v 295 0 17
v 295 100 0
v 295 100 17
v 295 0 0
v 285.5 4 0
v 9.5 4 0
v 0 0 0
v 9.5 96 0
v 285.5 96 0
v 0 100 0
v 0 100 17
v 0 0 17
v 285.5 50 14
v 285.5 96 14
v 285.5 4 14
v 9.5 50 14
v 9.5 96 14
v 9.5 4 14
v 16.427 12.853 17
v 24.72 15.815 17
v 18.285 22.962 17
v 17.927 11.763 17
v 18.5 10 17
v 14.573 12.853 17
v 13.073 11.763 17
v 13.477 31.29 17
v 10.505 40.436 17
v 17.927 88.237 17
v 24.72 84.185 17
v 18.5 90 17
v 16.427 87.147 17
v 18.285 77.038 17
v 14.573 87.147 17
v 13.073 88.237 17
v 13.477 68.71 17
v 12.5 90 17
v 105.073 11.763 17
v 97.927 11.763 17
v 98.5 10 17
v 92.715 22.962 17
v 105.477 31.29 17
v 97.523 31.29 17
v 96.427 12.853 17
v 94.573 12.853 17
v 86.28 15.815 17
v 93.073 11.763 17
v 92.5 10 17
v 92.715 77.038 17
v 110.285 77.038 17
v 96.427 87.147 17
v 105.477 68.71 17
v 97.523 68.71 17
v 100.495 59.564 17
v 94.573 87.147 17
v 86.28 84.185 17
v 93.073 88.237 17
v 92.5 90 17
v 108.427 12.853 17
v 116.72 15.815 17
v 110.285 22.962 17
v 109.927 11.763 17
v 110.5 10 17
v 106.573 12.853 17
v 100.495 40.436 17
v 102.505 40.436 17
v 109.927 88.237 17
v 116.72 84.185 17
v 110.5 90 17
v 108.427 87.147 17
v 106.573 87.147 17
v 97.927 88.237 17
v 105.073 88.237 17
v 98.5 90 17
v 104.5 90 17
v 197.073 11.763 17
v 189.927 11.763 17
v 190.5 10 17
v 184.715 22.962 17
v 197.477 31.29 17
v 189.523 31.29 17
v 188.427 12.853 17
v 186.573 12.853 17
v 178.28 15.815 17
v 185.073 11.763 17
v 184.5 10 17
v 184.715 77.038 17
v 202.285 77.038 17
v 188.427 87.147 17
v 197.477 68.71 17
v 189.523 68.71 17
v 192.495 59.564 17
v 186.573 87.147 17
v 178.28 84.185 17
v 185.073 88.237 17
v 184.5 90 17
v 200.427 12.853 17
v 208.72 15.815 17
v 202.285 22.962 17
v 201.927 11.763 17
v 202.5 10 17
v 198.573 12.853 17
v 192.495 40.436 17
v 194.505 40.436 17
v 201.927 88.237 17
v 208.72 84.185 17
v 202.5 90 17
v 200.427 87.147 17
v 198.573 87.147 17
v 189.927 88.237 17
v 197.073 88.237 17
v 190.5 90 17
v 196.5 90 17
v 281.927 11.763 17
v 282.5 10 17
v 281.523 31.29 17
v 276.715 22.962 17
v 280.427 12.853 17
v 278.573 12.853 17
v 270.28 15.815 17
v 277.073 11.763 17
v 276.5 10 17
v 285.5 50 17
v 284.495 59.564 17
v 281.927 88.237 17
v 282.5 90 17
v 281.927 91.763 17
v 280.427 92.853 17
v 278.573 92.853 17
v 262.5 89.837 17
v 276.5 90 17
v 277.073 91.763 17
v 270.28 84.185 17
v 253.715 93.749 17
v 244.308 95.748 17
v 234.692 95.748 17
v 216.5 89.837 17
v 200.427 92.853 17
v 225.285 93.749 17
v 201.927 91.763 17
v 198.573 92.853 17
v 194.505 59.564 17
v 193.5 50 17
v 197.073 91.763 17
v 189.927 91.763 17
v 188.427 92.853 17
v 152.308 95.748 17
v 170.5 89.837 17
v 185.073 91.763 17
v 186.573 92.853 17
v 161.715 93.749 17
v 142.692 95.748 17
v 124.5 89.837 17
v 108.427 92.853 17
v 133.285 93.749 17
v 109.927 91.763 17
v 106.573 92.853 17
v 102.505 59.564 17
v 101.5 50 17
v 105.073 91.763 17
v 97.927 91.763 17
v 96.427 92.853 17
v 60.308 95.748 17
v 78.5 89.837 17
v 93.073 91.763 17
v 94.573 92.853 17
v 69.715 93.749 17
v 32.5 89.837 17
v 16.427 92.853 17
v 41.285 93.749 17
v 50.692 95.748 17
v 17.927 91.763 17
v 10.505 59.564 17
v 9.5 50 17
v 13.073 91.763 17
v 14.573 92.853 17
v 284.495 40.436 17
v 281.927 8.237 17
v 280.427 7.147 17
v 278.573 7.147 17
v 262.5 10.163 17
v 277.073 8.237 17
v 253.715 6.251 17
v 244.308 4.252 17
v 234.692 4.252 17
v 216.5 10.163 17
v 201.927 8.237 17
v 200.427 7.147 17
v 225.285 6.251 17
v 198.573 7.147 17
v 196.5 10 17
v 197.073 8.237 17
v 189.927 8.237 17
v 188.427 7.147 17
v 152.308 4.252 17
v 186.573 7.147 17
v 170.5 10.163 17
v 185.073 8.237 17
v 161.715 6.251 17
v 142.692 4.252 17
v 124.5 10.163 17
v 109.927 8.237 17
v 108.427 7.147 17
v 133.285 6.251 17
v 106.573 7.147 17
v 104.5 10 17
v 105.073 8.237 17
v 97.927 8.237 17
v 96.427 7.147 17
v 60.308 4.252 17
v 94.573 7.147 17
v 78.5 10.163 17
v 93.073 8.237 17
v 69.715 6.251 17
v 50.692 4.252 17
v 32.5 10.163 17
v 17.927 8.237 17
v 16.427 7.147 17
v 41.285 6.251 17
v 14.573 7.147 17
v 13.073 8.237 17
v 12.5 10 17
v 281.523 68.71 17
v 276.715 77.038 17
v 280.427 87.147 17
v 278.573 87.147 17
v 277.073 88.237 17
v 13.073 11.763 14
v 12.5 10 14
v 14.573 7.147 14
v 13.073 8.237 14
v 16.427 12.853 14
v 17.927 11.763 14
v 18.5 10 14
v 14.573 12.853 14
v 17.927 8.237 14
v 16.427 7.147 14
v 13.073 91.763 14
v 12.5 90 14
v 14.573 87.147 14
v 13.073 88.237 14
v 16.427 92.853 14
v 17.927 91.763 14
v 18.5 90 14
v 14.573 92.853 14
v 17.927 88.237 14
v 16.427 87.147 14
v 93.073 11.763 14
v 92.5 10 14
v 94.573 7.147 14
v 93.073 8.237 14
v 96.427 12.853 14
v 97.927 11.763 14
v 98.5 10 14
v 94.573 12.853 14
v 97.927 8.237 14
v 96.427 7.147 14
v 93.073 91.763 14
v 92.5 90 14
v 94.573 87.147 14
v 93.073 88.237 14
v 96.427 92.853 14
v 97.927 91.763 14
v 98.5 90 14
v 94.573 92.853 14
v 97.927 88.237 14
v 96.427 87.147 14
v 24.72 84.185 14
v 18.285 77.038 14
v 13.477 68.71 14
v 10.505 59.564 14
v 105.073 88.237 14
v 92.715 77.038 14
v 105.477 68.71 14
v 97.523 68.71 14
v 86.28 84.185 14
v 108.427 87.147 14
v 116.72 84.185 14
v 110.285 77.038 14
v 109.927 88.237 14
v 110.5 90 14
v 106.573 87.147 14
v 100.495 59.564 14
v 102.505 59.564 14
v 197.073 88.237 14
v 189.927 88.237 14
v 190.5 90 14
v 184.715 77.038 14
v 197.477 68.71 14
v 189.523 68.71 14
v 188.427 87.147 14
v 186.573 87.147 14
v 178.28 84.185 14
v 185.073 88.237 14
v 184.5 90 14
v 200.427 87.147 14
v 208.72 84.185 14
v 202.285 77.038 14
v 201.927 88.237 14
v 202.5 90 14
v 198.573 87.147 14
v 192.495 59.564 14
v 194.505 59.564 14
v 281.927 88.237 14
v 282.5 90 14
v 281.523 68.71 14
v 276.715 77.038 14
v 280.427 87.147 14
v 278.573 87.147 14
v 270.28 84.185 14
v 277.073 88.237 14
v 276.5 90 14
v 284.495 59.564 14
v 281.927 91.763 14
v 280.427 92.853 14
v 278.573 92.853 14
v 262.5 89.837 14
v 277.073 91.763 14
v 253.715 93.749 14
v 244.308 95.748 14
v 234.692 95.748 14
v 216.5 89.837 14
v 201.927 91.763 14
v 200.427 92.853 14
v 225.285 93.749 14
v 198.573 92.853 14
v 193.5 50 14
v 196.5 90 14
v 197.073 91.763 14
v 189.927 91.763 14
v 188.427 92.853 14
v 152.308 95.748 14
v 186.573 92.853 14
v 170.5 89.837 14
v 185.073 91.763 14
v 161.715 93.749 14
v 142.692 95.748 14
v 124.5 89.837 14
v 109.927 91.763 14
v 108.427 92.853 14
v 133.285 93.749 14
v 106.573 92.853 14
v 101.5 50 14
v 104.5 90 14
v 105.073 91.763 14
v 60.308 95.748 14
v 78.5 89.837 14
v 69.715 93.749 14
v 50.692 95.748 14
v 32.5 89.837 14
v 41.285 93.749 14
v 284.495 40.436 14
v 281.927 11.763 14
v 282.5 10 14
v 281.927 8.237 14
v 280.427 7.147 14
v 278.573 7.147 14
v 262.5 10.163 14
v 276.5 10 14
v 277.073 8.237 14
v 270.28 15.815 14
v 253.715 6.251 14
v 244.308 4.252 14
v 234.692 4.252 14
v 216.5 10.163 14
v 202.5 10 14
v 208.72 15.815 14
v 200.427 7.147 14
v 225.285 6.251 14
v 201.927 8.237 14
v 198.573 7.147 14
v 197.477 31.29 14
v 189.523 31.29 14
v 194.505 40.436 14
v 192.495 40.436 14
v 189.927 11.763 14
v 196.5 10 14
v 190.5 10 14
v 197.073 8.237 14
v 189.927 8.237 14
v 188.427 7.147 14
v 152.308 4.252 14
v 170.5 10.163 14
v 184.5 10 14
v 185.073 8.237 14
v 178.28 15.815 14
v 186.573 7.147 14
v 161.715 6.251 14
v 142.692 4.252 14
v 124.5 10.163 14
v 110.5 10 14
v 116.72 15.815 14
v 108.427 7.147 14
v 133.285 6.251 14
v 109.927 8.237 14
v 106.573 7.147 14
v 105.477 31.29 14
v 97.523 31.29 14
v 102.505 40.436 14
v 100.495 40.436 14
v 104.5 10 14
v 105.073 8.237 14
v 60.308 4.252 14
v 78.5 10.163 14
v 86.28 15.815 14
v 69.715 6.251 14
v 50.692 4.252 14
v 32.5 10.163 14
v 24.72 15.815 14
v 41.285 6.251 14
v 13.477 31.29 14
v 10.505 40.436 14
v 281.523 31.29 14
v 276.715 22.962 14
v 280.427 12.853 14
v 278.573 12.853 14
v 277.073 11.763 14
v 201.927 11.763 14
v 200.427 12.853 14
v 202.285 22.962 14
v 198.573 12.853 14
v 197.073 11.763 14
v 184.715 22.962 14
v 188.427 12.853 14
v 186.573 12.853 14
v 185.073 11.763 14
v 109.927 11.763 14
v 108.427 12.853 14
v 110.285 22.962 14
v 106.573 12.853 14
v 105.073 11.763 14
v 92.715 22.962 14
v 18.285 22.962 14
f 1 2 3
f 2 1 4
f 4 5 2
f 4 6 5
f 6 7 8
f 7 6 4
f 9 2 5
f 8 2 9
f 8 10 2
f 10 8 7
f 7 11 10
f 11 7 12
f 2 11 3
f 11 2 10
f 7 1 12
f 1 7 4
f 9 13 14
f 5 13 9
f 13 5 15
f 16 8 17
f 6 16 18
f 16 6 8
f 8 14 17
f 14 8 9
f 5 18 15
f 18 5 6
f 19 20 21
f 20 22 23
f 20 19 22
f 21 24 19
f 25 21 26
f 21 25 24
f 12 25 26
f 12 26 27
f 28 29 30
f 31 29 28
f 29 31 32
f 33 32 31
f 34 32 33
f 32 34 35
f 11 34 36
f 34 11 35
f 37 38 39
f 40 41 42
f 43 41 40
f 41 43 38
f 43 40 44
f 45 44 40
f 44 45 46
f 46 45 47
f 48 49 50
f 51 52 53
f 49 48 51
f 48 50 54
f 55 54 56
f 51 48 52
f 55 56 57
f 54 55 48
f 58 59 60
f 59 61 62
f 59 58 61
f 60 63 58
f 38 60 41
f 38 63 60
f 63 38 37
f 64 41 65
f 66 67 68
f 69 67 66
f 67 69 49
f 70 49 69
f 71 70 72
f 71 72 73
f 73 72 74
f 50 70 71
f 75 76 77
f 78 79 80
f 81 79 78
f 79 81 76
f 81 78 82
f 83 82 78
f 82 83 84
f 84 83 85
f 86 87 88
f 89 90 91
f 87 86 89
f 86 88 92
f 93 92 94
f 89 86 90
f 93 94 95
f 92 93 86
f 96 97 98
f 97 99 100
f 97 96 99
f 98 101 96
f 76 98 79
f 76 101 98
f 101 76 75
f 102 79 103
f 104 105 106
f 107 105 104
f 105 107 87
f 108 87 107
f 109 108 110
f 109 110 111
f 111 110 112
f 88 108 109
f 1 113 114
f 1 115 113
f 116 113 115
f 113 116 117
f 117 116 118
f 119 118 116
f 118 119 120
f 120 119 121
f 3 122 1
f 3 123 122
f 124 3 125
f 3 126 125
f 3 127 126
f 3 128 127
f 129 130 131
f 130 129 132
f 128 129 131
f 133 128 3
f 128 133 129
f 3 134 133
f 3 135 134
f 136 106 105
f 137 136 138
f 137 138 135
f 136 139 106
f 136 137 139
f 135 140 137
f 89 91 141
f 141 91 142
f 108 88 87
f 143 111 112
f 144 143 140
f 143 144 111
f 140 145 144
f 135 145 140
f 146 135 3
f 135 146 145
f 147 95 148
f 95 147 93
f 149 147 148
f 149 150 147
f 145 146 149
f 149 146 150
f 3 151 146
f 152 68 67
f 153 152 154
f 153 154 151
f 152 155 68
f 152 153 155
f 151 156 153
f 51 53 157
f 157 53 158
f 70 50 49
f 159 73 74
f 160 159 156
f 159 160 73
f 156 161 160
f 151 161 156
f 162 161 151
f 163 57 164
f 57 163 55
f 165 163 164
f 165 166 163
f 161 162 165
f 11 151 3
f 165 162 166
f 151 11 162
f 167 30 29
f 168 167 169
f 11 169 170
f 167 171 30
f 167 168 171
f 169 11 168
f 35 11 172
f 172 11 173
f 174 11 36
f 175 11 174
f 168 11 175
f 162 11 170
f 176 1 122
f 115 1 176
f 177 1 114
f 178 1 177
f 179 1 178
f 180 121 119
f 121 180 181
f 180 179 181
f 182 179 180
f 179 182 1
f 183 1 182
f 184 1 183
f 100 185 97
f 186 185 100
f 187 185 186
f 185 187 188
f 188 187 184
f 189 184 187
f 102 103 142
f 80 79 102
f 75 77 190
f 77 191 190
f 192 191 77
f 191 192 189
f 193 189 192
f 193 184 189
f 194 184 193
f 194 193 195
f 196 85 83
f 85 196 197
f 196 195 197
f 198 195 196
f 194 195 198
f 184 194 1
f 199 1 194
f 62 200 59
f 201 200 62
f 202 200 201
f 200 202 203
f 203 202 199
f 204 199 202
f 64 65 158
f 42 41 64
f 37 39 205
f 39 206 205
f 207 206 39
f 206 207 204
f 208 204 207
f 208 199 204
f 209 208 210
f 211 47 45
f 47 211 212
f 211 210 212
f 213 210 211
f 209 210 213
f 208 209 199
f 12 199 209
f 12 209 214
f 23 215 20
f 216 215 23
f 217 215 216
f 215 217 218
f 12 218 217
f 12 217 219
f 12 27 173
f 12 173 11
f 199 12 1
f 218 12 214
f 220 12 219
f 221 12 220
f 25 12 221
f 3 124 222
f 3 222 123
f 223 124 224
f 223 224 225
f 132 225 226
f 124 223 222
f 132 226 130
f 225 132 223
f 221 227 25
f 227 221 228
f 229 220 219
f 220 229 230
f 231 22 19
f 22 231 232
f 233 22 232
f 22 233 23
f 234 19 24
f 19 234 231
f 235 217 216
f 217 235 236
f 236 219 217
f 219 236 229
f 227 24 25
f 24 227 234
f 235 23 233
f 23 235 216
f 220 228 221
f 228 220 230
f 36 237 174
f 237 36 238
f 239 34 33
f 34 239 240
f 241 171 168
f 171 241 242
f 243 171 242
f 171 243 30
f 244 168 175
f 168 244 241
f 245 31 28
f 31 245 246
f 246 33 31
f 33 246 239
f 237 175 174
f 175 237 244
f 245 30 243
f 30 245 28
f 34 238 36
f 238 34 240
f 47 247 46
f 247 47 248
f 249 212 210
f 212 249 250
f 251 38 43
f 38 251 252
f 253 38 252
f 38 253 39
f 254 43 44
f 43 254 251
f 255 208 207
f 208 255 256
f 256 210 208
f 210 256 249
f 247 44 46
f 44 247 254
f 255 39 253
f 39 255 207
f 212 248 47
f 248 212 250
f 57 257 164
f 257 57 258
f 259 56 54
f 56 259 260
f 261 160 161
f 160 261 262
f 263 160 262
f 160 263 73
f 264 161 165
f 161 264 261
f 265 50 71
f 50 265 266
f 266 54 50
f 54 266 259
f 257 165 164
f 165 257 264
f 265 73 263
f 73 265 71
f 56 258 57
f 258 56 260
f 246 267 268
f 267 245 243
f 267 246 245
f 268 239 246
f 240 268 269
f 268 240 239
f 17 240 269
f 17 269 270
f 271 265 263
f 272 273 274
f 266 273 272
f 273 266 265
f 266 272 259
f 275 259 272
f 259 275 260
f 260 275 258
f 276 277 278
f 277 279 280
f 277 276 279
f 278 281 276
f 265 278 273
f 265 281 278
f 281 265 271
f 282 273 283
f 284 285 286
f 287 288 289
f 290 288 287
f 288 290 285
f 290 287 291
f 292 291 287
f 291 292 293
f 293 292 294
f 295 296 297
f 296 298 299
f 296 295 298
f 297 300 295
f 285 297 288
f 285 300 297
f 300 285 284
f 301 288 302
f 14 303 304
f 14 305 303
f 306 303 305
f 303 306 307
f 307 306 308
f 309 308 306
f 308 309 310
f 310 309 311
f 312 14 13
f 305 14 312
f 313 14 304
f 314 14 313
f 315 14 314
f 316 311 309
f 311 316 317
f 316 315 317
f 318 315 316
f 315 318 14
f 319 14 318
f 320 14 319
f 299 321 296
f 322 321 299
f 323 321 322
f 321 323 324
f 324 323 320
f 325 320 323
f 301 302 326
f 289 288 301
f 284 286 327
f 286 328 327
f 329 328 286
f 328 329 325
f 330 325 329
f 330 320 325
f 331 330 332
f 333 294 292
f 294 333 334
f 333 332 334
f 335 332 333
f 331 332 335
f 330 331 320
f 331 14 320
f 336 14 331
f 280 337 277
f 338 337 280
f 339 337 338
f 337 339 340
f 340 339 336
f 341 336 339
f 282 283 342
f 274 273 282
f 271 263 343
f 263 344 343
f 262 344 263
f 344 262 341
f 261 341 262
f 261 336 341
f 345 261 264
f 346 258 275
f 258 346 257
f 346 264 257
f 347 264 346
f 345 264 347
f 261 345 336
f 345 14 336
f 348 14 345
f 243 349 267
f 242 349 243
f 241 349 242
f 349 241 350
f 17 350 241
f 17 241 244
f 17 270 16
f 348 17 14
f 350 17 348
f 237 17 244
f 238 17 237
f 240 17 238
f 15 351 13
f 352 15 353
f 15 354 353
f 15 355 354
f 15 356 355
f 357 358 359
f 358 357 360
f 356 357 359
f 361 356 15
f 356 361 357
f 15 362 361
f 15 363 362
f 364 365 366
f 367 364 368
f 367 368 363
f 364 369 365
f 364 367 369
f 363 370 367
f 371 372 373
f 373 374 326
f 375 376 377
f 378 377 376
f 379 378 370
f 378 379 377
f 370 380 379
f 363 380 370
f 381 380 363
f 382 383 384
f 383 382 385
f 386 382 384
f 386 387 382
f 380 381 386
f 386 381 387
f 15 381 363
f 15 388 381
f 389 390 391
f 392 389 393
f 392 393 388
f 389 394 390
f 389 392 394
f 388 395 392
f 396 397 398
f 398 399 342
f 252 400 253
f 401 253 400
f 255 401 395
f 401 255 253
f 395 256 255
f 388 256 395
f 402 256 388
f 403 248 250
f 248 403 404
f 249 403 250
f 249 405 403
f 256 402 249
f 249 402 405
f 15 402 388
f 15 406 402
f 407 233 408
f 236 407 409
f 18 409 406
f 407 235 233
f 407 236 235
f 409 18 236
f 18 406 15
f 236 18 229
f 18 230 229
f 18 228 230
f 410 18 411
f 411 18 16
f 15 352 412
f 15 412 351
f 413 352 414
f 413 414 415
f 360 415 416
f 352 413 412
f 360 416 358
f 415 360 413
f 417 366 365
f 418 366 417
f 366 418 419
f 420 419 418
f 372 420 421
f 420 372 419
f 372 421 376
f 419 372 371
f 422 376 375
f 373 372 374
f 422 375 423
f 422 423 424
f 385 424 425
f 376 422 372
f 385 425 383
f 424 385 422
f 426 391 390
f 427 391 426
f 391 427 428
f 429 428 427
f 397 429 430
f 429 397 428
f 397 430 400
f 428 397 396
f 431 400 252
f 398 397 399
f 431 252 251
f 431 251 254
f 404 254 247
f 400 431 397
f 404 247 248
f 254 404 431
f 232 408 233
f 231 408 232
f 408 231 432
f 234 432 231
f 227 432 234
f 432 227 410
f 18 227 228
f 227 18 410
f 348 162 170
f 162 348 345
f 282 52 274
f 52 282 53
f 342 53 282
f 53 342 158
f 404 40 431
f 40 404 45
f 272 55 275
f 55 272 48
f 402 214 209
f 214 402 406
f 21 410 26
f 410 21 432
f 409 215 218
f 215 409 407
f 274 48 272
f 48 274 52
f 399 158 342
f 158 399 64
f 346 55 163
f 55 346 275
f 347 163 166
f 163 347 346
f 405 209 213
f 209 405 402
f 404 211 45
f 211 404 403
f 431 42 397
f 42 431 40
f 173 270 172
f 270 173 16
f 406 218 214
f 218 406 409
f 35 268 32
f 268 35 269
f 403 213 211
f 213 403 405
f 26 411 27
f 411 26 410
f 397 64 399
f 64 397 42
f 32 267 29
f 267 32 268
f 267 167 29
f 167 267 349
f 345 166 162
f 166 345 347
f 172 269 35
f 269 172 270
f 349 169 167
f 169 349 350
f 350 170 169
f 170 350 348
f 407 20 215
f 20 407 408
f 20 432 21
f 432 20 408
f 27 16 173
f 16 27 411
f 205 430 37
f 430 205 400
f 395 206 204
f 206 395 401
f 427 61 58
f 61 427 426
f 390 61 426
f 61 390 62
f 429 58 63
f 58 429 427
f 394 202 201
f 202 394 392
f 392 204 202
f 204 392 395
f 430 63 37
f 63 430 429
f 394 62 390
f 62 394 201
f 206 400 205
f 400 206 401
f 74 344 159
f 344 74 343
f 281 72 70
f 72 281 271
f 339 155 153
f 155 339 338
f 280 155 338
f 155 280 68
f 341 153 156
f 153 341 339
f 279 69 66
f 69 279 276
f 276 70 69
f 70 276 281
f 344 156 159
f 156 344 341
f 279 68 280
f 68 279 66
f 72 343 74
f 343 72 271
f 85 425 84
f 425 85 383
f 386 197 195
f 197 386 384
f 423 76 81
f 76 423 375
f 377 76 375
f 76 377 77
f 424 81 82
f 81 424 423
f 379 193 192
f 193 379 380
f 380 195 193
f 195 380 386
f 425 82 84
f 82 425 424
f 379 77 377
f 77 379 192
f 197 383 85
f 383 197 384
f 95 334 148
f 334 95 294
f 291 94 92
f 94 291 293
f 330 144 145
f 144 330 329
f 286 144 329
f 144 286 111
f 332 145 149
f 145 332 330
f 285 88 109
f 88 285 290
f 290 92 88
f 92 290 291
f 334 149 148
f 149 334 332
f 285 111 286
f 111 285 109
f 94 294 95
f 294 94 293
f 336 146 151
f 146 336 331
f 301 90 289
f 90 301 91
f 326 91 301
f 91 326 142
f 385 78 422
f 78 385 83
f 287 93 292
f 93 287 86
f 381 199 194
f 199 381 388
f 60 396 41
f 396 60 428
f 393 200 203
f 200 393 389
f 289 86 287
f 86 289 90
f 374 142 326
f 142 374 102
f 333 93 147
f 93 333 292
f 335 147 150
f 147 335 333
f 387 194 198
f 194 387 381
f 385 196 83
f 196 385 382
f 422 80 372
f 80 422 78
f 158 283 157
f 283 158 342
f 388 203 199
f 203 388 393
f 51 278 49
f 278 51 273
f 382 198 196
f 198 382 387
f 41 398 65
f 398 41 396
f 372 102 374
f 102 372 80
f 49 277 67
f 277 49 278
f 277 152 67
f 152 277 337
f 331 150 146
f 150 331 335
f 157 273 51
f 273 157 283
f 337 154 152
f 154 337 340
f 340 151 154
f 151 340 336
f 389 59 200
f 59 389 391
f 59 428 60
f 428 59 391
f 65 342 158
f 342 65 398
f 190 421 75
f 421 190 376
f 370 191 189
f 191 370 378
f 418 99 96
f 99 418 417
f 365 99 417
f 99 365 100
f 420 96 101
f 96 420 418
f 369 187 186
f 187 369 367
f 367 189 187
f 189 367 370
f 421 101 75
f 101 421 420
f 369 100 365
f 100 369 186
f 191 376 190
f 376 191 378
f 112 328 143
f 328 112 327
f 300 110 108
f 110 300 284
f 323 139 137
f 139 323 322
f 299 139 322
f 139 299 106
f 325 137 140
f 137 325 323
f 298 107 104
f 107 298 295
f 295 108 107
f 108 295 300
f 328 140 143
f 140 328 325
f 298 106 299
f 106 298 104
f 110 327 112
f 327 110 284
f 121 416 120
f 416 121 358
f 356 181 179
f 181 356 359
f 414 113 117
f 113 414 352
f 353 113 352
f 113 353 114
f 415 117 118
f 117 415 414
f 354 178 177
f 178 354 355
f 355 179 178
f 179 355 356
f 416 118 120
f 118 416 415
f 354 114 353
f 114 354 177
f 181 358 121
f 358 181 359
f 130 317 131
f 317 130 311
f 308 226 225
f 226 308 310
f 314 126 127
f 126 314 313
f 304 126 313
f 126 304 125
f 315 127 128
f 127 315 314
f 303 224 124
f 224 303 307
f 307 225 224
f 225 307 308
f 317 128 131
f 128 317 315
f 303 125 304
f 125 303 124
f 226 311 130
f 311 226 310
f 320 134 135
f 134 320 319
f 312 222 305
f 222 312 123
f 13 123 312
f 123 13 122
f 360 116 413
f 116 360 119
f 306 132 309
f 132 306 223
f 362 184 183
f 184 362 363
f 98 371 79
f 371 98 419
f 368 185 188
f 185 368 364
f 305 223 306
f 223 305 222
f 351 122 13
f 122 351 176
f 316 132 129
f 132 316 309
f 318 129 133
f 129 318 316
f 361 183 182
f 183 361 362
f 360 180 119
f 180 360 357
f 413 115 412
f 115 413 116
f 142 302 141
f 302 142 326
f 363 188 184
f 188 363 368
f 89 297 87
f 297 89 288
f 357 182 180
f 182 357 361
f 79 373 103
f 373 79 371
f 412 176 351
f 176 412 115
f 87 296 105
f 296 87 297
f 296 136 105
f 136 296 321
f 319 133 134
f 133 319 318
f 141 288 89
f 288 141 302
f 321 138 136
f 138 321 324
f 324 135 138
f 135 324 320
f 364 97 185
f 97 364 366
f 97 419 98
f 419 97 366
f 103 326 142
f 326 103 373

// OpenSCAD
// Height / width in mm
fan_size=92;

module fan_edges(radius=46, n_fans=2, screw_hole_radius=4.5) {
    difference() {
        cube([fan_size, fan_size, 3]);
        
        // Center large cylinder in the middle
        translate([fan_size/2, fan_size/2, -1])
            cylinder(h=10, r=radius, center=true);
        
        // Small cylinders at each corner
        for (x = [6, fan_size-6], y = [6, fan_size-6]) {
            translate([x, y, -1])
                cylinder(h=10, r=screw_hole_radius);
        }
    }
}

module repeated_fan_edges(radius=46, n_fans=2, screw_hole_radius=4.5) {
    for (i = [0:n_fans-1]) {
        translate([i * fan_size, 0, 0])
            fan_edges(radius=radius, screw_hole_radius=screw_hole_radius);
    }
}

// Call the module to render it
// repeated_fan_edges(radius=49);
module frame(radius=46, n_fans=2, screw_hole_radius=4.5) {
    length = 100 * n_fans - 5;

    difference() {
        cube([length, 100, 14]);
        translate([(length - n_fans*fan_size) / 2, (100 - fan_size) / 2, -1])
            cube([3*fan_size, fan_size, 16]);
    }
    
    difference() {
        translate([0, 0, 14])
        cube([length, 100, 3]);
        translate([(length - n_fans*fan_size) / 2, (100 - fan_size) / 2, -1])
            cube([3*fan_size, fan_size, 20]);
    }
    translate([(length - n_fans*fan_size) / 2, (100 - fan_size) / 2, 14])
      repeated_fan_edges(radius=radius, n_fans=n_fans, screw_hole_radius=screw_hole_radius);
    
}

frame(n_fans=3, screw_hole_radius=3);
// Render the frame with cutouts
// frame(radius=45.2);
